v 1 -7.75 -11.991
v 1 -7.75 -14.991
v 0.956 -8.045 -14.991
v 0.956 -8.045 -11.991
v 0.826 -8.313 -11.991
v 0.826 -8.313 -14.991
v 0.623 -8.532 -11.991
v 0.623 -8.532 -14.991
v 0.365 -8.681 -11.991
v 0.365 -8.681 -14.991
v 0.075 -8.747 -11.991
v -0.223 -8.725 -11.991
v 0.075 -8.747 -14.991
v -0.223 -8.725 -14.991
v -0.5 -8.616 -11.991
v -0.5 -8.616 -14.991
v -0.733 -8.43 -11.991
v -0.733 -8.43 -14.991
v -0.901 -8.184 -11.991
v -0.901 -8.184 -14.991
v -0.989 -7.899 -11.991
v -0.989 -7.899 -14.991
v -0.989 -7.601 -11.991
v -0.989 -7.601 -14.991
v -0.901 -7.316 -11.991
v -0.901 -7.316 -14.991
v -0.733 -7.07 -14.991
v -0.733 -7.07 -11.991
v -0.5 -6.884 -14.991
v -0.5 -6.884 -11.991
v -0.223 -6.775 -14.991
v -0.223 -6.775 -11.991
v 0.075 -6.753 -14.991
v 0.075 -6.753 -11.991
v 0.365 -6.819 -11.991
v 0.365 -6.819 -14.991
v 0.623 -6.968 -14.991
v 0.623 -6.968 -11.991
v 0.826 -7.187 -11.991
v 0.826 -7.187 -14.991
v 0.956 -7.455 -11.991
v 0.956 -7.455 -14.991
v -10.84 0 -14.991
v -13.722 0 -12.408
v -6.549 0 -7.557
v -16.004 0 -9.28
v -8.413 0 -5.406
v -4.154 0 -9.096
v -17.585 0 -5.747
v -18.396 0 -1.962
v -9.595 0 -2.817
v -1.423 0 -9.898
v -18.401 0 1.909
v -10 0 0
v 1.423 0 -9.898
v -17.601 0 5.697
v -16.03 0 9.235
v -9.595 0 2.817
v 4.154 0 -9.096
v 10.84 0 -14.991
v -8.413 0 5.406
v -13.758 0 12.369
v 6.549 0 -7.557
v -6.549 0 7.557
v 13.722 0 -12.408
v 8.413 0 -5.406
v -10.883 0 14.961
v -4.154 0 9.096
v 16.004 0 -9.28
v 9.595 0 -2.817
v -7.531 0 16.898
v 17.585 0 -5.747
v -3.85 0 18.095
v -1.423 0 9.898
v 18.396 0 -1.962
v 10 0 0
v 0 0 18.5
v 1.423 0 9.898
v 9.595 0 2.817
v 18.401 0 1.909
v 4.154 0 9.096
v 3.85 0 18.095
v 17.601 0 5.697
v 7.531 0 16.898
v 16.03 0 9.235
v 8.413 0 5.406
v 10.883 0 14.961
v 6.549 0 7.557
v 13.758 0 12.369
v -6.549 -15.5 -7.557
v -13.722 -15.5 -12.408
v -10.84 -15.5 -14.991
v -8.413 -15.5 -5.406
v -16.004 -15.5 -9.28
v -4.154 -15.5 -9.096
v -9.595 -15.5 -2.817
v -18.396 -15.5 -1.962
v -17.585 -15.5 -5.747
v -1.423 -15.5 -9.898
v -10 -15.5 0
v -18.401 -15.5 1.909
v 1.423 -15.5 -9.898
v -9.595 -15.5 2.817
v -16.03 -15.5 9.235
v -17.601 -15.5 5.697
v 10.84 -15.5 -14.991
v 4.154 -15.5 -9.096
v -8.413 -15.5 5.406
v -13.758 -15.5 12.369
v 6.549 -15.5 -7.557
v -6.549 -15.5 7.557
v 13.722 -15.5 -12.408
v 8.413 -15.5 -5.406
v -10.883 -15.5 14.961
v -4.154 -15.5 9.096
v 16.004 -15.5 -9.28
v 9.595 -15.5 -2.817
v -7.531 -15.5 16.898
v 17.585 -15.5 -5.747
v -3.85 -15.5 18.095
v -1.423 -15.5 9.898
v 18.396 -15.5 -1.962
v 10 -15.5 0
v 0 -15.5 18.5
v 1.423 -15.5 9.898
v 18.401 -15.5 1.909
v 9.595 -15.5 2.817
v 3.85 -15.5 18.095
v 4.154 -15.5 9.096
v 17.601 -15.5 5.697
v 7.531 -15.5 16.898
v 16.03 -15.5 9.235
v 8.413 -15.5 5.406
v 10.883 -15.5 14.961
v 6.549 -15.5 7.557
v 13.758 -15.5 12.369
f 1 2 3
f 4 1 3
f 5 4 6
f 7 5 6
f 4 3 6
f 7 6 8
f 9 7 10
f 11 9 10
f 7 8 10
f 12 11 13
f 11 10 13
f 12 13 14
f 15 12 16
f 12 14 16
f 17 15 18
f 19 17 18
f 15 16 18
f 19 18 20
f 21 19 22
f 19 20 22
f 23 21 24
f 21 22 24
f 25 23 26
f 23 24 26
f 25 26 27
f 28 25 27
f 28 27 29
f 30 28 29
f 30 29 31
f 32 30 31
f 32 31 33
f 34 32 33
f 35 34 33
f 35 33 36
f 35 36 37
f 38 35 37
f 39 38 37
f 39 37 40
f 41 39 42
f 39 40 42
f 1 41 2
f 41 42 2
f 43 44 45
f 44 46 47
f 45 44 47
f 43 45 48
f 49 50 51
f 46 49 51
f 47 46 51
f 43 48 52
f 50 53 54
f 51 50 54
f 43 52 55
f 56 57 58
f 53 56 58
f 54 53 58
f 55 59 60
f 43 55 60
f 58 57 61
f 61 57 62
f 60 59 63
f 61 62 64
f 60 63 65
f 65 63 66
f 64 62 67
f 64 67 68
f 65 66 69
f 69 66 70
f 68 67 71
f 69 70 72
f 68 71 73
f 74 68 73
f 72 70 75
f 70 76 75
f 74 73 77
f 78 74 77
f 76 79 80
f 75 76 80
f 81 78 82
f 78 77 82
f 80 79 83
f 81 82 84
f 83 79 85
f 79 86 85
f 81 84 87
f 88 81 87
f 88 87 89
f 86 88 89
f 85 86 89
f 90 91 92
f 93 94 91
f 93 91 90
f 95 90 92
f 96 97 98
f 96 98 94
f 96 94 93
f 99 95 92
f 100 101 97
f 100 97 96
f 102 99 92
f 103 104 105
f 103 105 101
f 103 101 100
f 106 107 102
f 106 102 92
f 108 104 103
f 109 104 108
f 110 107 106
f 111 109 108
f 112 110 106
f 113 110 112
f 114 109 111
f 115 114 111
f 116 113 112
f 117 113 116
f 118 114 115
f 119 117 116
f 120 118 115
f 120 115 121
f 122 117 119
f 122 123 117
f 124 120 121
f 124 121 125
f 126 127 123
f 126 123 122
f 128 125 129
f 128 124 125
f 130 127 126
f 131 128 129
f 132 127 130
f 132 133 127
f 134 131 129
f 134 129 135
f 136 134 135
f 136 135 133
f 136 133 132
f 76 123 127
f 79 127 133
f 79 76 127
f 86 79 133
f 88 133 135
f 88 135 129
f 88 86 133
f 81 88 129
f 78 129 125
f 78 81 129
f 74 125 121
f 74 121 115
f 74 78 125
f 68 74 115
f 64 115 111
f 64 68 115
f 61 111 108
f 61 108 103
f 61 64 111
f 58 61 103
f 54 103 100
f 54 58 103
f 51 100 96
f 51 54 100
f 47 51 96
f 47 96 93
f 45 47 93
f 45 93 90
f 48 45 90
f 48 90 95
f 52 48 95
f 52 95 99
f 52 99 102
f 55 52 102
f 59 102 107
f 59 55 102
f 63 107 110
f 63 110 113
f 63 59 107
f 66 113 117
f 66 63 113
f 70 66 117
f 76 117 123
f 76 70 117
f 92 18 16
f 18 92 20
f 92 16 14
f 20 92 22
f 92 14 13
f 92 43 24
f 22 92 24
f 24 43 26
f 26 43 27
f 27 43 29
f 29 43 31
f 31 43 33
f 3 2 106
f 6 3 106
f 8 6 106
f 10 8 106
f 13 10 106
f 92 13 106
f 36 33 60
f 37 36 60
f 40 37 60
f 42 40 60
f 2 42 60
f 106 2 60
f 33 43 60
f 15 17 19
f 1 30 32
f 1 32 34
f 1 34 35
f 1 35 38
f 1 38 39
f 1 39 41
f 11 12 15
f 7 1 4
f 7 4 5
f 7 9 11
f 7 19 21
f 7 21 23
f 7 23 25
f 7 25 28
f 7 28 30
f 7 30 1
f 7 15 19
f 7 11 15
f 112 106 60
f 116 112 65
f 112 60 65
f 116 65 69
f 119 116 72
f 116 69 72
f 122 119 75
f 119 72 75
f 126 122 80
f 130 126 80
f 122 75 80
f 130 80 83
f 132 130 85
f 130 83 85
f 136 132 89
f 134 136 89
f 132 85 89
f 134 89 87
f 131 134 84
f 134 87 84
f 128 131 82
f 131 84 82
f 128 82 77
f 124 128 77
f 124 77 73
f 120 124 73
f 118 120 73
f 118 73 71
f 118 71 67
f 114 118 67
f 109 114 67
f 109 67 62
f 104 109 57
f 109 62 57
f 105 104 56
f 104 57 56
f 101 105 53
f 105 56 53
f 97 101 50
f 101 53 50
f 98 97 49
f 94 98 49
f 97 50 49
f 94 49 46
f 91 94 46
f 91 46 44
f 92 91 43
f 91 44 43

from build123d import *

# Parameters (mm, degrees)
F0_R     = 10
F1_DEPTH = 15.5
F2_R     = 1
F3_DEPTH = 3


with BuildPart() as f1:
    # F0 (on Front) → F1 (new body)
    with BuildSketch(Plane.XZ):
        with BuildLine():
            Line((-10.84, -14.991478), (10.84, -14.991478))
            ThreePointArc((10.84, -14.991478), (0, 18.5), (-10.84, -14.991478))
        make_face()
        Circle(F0_R, mode=Mode.SUBTRACT)
    extrude(amount=F1_DEPTH)

    # F2 (on face) → F3 (cut)
    with BuildSketch(Plane(origin=(0, 0, -14.991478), x_dir=(1, 0, 0), z_dir=(0, 0, -1))):
        with Locations((0, 7.75)):
            Circle(F2_R)
    extrude(amount=-F3_DEPTH, mode=Mode.SUBTRACT)


solid = f1.part
